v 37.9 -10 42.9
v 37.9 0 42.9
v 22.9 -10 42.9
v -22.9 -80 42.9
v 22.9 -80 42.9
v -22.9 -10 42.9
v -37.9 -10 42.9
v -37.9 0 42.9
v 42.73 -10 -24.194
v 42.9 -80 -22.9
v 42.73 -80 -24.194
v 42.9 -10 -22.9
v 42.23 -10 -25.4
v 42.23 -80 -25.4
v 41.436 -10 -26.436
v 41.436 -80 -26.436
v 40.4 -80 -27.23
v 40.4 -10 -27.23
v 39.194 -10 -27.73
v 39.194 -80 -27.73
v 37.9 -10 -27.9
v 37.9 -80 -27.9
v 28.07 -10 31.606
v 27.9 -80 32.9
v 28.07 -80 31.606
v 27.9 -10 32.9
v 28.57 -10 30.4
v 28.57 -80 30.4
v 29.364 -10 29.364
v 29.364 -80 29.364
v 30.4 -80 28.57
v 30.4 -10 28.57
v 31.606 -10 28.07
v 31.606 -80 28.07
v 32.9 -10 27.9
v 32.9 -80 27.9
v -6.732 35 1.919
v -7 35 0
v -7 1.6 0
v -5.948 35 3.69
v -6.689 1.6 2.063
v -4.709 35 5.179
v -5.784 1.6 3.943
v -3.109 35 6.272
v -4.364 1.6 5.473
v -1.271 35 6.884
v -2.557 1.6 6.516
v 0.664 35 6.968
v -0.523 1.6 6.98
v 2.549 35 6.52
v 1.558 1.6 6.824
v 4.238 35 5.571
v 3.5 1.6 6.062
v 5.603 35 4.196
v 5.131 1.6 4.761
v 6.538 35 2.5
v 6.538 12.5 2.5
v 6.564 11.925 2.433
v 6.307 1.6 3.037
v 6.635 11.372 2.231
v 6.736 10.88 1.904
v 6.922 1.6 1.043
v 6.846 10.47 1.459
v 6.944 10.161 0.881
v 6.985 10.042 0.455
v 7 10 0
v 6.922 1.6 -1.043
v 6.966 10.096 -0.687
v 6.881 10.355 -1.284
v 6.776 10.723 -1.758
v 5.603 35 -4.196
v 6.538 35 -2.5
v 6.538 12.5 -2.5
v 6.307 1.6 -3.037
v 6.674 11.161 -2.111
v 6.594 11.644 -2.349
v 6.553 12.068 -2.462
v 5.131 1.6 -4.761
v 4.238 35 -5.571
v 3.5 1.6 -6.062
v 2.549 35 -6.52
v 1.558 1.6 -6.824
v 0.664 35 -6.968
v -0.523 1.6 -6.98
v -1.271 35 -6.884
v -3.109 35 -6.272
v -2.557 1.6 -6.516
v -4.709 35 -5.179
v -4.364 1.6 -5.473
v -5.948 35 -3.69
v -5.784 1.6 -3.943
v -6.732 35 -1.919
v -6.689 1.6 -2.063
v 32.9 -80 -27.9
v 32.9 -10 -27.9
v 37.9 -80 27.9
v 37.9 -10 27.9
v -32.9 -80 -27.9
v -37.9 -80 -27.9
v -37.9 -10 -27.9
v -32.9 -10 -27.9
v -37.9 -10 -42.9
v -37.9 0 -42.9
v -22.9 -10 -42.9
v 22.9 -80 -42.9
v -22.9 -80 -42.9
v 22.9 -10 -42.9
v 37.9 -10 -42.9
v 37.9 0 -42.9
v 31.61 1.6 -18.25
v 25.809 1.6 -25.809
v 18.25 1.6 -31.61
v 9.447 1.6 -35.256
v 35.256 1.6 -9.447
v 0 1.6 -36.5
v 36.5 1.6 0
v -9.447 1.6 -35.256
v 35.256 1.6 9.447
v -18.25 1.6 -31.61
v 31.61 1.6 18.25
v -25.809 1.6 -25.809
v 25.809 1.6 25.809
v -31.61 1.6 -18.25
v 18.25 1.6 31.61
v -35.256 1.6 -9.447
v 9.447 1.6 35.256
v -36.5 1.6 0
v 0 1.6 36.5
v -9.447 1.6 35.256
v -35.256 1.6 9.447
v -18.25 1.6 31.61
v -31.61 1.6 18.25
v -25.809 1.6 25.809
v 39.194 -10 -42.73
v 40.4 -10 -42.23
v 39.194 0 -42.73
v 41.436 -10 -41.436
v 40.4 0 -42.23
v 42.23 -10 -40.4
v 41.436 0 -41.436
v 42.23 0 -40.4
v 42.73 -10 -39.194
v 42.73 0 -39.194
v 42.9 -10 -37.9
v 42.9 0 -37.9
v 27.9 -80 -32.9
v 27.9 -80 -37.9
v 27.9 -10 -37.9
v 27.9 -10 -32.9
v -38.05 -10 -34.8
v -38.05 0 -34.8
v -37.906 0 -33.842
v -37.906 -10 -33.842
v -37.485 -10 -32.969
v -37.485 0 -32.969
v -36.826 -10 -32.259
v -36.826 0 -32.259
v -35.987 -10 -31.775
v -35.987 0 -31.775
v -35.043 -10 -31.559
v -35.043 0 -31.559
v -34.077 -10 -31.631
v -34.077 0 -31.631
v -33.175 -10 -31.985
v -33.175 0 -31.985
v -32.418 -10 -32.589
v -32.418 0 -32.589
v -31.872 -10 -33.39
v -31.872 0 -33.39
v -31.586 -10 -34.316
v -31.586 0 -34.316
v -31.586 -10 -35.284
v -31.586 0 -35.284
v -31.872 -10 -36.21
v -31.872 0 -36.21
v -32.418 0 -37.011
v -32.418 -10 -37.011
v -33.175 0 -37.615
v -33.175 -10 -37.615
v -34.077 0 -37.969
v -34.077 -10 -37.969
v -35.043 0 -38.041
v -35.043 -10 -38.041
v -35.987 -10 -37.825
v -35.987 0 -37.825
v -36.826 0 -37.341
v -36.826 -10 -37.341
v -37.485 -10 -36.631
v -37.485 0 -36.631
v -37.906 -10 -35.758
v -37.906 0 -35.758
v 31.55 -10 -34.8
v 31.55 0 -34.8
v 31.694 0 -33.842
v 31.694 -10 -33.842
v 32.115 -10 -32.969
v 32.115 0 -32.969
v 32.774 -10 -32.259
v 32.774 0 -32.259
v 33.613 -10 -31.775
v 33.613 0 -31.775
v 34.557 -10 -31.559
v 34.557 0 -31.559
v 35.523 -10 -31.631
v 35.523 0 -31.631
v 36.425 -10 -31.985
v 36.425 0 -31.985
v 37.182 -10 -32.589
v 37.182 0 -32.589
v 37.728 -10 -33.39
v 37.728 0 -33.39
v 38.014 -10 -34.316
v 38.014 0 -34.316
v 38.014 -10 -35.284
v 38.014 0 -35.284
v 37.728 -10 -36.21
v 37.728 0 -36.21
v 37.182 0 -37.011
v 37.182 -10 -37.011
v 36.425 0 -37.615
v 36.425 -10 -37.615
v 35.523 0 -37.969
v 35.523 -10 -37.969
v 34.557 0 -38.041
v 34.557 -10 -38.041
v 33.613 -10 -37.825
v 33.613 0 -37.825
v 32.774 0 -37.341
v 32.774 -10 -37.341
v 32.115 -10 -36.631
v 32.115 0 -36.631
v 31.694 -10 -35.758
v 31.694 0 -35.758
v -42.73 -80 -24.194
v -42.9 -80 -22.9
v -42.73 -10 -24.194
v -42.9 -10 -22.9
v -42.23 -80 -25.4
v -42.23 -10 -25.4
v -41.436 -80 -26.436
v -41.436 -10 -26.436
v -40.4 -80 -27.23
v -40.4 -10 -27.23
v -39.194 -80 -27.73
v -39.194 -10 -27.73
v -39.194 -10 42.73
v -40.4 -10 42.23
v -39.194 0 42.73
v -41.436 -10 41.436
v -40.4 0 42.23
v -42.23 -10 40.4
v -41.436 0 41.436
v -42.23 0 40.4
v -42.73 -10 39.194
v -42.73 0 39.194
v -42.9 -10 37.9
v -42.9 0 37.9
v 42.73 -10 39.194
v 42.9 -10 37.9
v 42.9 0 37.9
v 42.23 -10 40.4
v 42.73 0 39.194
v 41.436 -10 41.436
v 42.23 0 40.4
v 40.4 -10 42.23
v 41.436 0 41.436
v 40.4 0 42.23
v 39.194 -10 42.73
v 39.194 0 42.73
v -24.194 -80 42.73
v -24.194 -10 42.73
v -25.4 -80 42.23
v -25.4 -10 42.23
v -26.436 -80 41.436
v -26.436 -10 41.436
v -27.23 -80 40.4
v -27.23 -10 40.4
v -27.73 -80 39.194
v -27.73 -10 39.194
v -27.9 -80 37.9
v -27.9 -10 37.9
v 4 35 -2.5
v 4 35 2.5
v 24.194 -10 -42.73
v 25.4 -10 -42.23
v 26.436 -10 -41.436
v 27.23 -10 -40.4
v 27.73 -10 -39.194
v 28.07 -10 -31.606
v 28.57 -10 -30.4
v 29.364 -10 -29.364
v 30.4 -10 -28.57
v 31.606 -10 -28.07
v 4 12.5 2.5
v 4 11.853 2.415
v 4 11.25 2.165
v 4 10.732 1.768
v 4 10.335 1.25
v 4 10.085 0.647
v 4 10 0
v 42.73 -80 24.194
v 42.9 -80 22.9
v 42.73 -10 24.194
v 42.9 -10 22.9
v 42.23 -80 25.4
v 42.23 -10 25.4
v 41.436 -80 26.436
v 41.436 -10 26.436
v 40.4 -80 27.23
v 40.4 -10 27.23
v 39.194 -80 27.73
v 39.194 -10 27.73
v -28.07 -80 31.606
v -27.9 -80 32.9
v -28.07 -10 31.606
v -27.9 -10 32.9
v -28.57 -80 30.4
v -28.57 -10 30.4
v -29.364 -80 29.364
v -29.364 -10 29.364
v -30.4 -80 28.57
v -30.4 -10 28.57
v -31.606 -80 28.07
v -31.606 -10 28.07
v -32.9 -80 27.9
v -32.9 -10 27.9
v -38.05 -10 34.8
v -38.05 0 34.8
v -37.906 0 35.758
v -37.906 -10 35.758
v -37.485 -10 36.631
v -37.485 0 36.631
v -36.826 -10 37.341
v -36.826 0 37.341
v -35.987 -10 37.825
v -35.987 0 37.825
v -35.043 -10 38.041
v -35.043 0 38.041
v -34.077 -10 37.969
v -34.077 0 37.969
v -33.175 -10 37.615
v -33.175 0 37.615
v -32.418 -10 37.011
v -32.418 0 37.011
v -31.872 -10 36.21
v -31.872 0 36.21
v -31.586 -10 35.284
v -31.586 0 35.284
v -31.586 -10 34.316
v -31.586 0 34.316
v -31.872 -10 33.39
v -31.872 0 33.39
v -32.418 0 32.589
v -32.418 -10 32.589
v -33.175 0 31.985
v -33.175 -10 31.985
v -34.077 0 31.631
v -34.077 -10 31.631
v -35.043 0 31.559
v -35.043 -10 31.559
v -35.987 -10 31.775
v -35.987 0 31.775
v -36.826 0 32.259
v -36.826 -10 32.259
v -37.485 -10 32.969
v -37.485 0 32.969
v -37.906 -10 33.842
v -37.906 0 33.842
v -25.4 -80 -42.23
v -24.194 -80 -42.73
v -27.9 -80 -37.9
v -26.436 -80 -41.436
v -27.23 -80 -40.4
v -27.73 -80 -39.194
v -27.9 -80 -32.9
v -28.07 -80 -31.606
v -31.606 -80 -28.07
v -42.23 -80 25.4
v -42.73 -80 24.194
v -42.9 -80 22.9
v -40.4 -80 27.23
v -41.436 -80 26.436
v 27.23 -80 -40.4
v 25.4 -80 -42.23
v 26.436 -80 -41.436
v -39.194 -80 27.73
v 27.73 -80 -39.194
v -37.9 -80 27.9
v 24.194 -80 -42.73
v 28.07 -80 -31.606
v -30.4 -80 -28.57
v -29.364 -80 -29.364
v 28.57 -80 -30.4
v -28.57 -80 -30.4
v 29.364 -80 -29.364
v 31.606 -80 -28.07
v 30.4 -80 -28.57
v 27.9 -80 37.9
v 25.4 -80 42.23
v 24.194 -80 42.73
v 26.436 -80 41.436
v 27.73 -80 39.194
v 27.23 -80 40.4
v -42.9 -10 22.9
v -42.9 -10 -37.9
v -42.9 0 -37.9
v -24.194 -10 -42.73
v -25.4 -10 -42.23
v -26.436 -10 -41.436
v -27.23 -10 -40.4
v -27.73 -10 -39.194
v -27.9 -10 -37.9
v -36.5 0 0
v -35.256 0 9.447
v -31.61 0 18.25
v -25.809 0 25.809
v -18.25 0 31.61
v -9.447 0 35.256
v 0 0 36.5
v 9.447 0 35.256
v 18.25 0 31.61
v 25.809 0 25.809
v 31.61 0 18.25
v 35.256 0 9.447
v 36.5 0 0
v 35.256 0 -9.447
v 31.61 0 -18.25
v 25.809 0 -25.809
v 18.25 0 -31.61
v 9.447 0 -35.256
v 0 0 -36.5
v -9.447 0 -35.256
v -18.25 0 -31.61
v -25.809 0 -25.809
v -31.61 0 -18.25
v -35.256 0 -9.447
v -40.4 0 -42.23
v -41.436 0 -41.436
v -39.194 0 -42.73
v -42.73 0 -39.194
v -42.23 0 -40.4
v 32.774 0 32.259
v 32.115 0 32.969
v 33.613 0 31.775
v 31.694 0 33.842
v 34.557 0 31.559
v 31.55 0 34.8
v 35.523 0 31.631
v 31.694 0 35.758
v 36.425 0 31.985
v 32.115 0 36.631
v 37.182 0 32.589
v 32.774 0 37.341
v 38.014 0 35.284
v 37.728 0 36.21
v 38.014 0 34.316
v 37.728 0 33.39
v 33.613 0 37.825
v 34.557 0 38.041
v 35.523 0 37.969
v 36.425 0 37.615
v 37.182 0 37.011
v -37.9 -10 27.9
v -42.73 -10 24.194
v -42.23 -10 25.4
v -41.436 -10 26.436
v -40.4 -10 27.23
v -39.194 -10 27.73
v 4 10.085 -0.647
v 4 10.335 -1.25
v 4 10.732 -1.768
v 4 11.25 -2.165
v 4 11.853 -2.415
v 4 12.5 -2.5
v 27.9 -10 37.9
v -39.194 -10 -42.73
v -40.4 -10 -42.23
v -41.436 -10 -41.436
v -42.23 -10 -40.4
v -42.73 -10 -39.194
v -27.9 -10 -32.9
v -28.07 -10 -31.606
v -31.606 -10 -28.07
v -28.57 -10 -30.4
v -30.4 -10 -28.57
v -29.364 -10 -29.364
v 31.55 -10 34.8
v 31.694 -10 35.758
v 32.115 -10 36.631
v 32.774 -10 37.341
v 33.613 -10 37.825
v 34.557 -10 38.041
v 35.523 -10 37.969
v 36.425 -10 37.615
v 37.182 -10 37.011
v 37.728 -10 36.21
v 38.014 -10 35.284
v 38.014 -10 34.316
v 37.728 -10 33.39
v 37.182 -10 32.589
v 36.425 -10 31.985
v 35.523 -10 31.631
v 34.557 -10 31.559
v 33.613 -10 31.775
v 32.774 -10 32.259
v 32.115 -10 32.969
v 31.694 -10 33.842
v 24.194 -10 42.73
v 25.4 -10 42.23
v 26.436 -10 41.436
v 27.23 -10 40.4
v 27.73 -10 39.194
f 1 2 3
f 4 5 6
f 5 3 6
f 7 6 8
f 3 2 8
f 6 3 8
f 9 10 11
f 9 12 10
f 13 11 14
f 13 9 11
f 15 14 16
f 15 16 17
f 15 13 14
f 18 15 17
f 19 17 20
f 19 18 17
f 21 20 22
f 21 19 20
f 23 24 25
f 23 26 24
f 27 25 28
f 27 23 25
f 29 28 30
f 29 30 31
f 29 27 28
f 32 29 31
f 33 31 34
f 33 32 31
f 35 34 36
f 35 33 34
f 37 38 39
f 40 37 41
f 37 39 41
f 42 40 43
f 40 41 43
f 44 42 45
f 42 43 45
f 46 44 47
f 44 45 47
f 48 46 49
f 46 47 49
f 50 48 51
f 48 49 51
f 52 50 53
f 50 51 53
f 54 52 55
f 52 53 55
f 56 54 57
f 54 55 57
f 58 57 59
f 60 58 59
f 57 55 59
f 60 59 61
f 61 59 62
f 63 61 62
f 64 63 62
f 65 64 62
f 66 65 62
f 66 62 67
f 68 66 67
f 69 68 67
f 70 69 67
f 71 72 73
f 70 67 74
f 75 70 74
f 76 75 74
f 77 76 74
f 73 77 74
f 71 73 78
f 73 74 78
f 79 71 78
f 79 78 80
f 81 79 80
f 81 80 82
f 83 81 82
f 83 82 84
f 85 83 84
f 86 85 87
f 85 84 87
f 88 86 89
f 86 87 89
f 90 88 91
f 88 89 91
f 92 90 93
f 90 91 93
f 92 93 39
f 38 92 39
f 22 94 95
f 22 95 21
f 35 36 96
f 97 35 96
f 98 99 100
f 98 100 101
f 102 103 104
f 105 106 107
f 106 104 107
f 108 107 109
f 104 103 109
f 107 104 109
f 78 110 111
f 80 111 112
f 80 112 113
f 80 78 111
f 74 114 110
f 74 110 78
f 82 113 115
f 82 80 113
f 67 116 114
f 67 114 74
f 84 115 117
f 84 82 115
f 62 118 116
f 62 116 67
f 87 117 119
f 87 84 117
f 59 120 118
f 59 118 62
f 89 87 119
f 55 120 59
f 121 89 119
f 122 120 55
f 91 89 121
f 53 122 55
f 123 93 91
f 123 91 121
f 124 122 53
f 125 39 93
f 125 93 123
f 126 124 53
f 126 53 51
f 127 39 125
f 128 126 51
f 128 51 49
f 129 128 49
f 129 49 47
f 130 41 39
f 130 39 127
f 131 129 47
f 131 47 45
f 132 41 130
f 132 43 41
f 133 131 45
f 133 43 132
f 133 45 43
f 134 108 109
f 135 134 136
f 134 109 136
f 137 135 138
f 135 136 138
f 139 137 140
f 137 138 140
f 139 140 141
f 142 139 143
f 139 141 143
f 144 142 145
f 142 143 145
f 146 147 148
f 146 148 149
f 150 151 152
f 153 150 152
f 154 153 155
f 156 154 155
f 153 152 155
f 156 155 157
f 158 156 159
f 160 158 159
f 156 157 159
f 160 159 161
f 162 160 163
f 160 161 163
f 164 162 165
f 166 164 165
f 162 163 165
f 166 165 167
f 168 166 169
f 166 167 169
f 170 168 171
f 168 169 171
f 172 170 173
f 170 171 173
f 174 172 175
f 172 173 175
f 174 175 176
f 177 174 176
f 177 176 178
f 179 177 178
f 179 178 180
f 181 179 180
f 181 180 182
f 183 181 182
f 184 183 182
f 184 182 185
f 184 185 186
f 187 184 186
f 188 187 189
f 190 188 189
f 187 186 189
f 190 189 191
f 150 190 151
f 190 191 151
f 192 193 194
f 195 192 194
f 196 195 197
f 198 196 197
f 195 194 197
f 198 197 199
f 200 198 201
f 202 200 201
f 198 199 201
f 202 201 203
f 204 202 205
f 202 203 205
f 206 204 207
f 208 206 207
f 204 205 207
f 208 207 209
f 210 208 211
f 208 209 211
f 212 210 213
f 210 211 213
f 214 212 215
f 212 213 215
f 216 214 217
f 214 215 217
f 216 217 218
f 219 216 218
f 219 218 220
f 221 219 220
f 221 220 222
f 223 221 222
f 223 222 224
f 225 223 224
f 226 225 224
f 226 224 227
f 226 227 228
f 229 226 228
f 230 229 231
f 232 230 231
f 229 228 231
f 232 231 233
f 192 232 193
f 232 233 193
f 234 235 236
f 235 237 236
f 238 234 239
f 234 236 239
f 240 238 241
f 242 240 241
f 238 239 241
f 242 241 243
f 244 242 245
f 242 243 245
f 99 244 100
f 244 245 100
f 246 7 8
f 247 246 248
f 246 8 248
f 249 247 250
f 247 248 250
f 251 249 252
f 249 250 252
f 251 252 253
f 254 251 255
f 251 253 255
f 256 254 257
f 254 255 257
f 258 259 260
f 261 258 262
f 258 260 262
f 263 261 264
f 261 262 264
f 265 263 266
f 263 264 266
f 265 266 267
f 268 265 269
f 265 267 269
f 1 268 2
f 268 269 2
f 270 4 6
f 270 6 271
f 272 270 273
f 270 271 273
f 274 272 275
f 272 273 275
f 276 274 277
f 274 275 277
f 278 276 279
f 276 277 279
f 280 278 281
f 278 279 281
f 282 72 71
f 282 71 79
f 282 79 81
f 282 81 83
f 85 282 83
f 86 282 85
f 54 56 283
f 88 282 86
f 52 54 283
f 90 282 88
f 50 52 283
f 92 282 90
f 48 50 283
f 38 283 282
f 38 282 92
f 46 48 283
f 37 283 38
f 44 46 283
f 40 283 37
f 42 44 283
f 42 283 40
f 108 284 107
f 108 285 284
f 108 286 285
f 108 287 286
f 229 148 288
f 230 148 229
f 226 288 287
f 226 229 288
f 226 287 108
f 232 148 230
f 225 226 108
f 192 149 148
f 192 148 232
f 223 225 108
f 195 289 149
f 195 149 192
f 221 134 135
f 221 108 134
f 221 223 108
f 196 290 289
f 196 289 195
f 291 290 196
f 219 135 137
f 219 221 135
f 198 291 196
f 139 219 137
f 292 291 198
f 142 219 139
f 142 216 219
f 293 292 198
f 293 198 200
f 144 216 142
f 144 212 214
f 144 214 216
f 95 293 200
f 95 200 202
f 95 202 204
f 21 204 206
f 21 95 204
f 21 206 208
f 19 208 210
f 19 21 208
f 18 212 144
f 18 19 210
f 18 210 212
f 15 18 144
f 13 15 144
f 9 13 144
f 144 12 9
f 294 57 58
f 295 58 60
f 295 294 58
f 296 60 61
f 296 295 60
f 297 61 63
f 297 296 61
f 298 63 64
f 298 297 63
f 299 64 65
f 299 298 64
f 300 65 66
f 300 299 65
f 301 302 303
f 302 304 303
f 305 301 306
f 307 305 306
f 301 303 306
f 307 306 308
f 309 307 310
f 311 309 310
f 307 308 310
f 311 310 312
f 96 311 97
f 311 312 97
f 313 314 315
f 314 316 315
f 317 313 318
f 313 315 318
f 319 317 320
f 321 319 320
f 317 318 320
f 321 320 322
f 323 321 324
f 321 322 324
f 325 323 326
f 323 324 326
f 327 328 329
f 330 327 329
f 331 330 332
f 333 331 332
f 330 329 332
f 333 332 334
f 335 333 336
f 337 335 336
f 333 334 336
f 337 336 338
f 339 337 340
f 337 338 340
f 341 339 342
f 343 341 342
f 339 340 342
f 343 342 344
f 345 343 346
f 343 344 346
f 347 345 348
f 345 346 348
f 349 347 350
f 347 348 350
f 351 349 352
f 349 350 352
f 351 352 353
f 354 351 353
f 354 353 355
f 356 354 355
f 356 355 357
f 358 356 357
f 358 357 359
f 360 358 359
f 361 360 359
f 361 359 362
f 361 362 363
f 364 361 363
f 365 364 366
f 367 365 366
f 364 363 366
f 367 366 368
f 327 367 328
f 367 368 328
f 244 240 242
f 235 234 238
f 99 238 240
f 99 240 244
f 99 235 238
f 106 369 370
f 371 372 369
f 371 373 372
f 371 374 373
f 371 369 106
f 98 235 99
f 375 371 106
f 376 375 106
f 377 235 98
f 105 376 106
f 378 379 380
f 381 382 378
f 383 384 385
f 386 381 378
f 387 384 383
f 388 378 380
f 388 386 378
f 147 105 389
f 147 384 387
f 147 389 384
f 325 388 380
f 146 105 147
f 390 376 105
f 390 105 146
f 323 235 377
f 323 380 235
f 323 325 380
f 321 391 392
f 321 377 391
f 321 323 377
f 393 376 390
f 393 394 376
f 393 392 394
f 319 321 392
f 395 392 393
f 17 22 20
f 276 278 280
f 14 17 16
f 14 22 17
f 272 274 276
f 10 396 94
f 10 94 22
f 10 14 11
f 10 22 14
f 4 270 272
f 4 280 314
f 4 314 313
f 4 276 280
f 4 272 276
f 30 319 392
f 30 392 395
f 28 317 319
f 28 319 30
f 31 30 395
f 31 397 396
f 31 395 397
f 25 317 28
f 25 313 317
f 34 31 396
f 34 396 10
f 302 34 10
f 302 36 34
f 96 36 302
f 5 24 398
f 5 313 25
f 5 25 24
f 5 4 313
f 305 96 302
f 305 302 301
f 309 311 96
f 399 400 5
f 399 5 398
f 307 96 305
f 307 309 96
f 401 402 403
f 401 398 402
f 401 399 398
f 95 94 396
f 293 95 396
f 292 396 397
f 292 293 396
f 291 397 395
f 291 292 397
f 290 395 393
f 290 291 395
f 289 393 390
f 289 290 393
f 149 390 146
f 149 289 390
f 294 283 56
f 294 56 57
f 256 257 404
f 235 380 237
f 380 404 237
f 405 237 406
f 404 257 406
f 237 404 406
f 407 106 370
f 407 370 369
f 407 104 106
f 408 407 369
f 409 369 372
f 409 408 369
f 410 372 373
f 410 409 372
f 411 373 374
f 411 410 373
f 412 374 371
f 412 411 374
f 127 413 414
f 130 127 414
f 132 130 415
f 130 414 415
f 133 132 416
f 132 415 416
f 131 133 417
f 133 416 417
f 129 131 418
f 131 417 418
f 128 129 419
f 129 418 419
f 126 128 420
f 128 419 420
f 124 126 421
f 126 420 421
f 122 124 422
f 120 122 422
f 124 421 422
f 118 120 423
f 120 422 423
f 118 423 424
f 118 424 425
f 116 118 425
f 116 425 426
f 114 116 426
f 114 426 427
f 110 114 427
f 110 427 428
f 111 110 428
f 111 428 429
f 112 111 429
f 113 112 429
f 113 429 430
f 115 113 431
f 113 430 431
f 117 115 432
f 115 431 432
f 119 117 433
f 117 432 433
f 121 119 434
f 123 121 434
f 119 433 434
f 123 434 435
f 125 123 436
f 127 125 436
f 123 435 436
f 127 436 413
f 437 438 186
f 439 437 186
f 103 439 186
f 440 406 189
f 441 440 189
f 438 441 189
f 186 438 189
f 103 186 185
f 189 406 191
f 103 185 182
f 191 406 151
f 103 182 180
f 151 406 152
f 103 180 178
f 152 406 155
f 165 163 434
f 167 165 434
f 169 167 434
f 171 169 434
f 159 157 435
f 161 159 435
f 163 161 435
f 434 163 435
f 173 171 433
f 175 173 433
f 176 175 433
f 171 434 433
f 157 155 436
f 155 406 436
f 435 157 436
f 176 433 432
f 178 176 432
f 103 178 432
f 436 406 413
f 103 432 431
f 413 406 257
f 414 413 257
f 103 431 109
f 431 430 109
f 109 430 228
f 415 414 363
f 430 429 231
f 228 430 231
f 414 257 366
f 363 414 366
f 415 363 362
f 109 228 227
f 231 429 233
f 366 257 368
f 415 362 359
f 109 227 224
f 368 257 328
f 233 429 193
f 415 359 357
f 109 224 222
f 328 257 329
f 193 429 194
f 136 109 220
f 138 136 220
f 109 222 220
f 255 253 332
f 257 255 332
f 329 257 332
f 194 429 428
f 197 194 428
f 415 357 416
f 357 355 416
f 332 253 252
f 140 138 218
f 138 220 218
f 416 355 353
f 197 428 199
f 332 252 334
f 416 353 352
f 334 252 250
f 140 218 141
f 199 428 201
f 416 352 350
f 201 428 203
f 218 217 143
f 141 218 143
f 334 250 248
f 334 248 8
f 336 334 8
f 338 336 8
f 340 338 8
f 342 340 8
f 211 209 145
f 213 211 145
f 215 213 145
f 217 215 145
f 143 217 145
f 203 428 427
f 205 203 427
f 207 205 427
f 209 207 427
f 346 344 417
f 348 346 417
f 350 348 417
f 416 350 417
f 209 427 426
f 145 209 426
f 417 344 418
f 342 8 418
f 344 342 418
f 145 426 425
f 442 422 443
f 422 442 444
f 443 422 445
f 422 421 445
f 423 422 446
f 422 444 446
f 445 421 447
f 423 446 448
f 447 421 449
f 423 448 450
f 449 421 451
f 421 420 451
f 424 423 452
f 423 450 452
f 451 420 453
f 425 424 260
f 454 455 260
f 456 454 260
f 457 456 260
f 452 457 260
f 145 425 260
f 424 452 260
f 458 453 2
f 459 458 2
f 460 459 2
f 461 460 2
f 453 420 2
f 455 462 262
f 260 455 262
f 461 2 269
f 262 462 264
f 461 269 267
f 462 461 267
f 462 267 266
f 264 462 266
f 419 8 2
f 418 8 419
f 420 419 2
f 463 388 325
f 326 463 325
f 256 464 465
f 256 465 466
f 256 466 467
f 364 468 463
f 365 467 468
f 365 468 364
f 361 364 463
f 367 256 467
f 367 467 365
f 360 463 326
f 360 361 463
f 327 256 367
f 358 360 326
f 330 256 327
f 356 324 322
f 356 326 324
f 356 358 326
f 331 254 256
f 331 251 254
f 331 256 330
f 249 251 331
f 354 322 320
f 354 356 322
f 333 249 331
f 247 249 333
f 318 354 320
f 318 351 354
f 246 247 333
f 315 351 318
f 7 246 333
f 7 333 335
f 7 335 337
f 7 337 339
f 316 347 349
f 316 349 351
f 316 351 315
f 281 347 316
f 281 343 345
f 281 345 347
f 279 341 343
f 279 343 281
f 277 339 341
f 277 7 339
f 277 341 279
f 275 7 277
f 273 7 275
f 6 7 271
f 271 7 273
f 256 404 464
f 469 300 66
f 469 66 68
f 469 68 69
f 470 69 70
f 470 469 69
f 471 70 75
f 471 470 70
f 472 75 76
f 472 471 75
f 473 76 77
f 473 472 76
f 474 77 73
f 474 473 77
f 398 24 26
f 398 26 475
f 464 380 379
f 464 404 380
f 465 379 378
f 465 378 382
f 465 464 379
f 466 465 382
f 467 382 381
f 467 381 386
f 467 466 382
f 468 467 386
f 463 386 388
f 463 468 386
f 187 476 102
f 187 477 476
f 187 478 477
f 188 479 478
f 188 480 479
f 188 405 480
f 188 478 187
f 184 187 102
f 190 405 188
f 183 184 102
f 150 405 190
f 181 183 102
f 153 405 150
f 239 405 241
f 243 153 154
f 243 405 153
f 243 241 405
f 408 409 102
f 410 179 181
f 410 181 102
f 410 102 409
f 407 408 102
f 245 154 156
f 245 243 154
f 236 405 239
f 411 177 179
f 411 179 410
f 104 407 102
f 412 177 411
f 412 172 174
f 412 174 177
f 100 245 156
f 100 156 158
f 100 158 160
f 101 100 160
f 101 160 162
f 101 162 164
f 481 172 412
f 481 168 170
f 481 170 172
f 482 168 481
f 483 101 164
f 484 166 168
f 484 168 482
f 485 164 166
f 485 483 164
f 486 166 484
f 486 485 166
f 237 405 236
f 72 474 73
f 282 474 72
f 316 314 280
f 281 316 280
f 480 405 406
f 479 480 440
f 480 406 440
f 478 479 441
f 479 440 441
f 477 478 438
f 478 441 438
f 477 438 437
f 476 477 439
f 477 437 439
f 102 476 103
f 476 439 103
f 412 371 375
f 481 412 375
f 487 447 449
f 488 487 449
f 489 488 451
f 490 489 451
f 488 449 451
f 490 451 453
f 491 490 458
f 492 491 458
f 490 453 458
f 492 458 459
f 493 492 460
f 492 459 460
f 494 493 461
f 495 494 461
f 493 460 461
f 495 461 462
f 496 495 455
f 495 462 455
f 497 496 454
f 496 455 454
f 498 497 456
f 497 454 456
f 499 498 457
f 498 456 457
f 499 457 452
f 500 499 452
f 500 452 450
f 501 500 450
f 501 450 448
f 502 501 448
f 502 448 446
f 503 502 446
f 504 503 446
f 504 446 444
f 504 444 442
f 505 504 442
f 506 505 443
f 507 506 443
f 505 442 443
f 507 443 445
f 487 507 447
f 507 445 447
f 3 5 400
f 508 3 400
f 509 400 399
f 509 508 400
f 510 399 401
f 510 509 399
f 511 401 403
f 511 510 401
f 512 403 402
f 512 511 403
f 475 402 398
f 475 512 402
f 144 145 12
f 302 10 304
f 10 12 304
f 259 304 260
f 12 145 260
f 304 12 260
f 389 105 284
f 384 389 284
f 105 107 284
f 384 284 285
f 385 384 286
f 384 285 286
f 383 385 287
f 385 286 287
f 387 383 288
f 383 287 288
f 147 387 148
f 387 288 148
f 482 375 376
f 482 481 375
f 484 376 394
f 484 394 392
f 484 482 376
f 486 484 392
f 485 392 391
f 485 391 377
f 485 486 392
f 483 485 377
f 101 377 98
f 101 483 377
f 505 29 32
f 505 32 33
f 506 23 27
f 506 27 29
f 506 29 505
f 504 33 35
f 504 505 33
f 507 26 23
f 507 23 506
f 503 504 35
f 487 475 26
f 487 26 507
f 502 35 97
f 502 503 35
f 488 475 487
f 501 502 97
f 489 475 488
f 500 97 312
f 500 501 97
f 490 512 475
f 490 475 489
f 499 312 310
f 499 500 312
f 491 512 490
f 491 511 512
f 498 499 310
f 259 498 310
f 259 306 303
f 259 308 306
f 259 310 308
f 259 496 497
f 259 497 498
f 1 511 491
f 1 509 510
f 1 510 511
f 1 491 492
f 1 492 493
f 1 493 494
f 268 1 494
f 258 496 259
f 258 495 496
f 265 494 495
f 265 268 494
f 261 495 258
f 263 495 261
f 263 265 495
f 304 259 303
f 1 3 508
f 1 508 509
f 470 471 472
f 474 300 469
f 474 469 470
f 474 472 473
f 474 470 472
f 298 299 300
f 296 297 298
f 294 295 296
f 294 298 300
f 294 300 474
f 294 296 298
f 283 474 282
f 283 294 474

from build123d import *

# Parameters (mm, degrees)
F1_DEPTH  = 80
F2_W      = 15
F2_H      = 15
F3_DEPTH  = 70
F4_R      = 3.25
F5_DEPTH  = 10
F6_R      = 5
F7_R      = 36.5
F8_DEPTH  = 1.6
F9_R      = 7
F10_DEPTH = 35
F13_DEPTH = 5


with BuildPart() as f1:
    # F0 (on Front) → F1 (new body)
    with BuildSketch(Plane.XZ):
        with BuildLine():
            Line((37.9, 42.9), (-37.9, 42.9))
            ThreePointArc((-37.9, 42.9), (-41.4355339059, 41.4355339059), (-42.9, 37.9))
            Line((-42.9, 37.9), (-42.9, -37.9))
            ThreePointArc((-42.9, -37.9), (-41.4355339059, -41.4355339059), (-37.9, -42.9))
            Line((-37.9, -42.9), (37.9, -42.9))
            ThreePointArc((37.9, -42.9), (41.4355339059, -41.4355339059), (42.9, -37.9))
            Line((42.9, -37.9), (42.9, 37.9))
            ThreePointArc((42.9, 37.9), (41.4355339059, 41.4355339059), (37.9, 42.9))
        make_face()
    extrude(amount=F1_DEPTH)

    # F2 (on face) → F3 (cut)
    with BuildSketch(Plane.XZ.offset(80)):
        with Locations((35.4, 35.4)):
            Rectangle(F2_W, F2_H)
        with Locations((-35.4, 35.4)):
            Rectangle(F2_W, F2_H)
        with Locations((-35.4, -35.4)):
            Rectangle(F2_W, F2_H)
        with Locations((35.4, -35.4)):
            Rectangle(F2_W, F2_H)
    extrude(amount=-F3_DEPTH, mode=Mode.SUBTRACT)

    # F4 (on face) → F5 (cut, through all)
    with BuildSketch(Plane(origin=(0, 0, 0), x_dir=(-1, 0, 0), z_dir=(0, 1, 0))):
        with Locations((34.8, 34.8)):
            Circle(F4_R)
        with Locations((-34.8, 34.8)):
            Circle(F4_R)
        with Locations((34.8, -34.8)):
            Circle(F4_R)
        with Locations((-34.8, -34.8)):
            Circle(F4_R)
    extrude(amount=-F5_DEPTH, mode=Mode.SUBTRACT)

    # F6
    f6_edges = [f1.edges().sort_by_distance(p)[0] for p in [
        (-42.9, -45, 27.9),
        (-42.9, -45, -27.9),
        (-27.9, -45, -27.9),
        (-27.9, -45, -42.9),
        (27.9, -45, -42.9),
        (-27.9, -45, 42.9),
        (27.9, -45, -27.9),
        (42.9, -45, -27.9),
        (42.9, -45, 27.9),
        (27.9, -45, 42.9),
        (27.9, -45, 27.9),
        (-27.9, -45, 27.9),
    ]]
    fillet(f6_edges, radius=F6_R)

    # F7 (on face) → F8 (join)
    with BuildSketch(Plane(origin=(0, 0, 0), x_dir=(-1, 0, 0), z_dir=(0, 1, 0))):
        Circle(F7_R)
    extrude(amount=F8_DEPTH)

    # F9 (on face) → F10 (join)
    with BuildSketch(Plane(origin=(0, 0, 0), x_dir=(-1, 0, 0), z_dir=(0, 1, 0))):
        Circle(F9_R)
    extrude(amount=F10_DEPTH)

    # F12 (on offset) → F13 (cut)
    with BuildSketch(Plane.YZ.offset(4)):
        with BuildLine():
            Line((35, 2.5), (12.5, 2.5))
            ThreePointArc((12.5, 2.5), (10.732233047, 1.767766953), (10, 0))
            ThreePointArc((10, 0), (10.732233047, -1.767766953), (12.5, -2.5))
            Line((12.5, -2.5), (35, -2.5))
            Line((35, -2.5), (35, 0))
            Line((35, 0), (35, 2.5))
        make_face()
    extrude(amount=F13_DEPTH, mode=Mode.SUBTRACT)


solid = f1.part
